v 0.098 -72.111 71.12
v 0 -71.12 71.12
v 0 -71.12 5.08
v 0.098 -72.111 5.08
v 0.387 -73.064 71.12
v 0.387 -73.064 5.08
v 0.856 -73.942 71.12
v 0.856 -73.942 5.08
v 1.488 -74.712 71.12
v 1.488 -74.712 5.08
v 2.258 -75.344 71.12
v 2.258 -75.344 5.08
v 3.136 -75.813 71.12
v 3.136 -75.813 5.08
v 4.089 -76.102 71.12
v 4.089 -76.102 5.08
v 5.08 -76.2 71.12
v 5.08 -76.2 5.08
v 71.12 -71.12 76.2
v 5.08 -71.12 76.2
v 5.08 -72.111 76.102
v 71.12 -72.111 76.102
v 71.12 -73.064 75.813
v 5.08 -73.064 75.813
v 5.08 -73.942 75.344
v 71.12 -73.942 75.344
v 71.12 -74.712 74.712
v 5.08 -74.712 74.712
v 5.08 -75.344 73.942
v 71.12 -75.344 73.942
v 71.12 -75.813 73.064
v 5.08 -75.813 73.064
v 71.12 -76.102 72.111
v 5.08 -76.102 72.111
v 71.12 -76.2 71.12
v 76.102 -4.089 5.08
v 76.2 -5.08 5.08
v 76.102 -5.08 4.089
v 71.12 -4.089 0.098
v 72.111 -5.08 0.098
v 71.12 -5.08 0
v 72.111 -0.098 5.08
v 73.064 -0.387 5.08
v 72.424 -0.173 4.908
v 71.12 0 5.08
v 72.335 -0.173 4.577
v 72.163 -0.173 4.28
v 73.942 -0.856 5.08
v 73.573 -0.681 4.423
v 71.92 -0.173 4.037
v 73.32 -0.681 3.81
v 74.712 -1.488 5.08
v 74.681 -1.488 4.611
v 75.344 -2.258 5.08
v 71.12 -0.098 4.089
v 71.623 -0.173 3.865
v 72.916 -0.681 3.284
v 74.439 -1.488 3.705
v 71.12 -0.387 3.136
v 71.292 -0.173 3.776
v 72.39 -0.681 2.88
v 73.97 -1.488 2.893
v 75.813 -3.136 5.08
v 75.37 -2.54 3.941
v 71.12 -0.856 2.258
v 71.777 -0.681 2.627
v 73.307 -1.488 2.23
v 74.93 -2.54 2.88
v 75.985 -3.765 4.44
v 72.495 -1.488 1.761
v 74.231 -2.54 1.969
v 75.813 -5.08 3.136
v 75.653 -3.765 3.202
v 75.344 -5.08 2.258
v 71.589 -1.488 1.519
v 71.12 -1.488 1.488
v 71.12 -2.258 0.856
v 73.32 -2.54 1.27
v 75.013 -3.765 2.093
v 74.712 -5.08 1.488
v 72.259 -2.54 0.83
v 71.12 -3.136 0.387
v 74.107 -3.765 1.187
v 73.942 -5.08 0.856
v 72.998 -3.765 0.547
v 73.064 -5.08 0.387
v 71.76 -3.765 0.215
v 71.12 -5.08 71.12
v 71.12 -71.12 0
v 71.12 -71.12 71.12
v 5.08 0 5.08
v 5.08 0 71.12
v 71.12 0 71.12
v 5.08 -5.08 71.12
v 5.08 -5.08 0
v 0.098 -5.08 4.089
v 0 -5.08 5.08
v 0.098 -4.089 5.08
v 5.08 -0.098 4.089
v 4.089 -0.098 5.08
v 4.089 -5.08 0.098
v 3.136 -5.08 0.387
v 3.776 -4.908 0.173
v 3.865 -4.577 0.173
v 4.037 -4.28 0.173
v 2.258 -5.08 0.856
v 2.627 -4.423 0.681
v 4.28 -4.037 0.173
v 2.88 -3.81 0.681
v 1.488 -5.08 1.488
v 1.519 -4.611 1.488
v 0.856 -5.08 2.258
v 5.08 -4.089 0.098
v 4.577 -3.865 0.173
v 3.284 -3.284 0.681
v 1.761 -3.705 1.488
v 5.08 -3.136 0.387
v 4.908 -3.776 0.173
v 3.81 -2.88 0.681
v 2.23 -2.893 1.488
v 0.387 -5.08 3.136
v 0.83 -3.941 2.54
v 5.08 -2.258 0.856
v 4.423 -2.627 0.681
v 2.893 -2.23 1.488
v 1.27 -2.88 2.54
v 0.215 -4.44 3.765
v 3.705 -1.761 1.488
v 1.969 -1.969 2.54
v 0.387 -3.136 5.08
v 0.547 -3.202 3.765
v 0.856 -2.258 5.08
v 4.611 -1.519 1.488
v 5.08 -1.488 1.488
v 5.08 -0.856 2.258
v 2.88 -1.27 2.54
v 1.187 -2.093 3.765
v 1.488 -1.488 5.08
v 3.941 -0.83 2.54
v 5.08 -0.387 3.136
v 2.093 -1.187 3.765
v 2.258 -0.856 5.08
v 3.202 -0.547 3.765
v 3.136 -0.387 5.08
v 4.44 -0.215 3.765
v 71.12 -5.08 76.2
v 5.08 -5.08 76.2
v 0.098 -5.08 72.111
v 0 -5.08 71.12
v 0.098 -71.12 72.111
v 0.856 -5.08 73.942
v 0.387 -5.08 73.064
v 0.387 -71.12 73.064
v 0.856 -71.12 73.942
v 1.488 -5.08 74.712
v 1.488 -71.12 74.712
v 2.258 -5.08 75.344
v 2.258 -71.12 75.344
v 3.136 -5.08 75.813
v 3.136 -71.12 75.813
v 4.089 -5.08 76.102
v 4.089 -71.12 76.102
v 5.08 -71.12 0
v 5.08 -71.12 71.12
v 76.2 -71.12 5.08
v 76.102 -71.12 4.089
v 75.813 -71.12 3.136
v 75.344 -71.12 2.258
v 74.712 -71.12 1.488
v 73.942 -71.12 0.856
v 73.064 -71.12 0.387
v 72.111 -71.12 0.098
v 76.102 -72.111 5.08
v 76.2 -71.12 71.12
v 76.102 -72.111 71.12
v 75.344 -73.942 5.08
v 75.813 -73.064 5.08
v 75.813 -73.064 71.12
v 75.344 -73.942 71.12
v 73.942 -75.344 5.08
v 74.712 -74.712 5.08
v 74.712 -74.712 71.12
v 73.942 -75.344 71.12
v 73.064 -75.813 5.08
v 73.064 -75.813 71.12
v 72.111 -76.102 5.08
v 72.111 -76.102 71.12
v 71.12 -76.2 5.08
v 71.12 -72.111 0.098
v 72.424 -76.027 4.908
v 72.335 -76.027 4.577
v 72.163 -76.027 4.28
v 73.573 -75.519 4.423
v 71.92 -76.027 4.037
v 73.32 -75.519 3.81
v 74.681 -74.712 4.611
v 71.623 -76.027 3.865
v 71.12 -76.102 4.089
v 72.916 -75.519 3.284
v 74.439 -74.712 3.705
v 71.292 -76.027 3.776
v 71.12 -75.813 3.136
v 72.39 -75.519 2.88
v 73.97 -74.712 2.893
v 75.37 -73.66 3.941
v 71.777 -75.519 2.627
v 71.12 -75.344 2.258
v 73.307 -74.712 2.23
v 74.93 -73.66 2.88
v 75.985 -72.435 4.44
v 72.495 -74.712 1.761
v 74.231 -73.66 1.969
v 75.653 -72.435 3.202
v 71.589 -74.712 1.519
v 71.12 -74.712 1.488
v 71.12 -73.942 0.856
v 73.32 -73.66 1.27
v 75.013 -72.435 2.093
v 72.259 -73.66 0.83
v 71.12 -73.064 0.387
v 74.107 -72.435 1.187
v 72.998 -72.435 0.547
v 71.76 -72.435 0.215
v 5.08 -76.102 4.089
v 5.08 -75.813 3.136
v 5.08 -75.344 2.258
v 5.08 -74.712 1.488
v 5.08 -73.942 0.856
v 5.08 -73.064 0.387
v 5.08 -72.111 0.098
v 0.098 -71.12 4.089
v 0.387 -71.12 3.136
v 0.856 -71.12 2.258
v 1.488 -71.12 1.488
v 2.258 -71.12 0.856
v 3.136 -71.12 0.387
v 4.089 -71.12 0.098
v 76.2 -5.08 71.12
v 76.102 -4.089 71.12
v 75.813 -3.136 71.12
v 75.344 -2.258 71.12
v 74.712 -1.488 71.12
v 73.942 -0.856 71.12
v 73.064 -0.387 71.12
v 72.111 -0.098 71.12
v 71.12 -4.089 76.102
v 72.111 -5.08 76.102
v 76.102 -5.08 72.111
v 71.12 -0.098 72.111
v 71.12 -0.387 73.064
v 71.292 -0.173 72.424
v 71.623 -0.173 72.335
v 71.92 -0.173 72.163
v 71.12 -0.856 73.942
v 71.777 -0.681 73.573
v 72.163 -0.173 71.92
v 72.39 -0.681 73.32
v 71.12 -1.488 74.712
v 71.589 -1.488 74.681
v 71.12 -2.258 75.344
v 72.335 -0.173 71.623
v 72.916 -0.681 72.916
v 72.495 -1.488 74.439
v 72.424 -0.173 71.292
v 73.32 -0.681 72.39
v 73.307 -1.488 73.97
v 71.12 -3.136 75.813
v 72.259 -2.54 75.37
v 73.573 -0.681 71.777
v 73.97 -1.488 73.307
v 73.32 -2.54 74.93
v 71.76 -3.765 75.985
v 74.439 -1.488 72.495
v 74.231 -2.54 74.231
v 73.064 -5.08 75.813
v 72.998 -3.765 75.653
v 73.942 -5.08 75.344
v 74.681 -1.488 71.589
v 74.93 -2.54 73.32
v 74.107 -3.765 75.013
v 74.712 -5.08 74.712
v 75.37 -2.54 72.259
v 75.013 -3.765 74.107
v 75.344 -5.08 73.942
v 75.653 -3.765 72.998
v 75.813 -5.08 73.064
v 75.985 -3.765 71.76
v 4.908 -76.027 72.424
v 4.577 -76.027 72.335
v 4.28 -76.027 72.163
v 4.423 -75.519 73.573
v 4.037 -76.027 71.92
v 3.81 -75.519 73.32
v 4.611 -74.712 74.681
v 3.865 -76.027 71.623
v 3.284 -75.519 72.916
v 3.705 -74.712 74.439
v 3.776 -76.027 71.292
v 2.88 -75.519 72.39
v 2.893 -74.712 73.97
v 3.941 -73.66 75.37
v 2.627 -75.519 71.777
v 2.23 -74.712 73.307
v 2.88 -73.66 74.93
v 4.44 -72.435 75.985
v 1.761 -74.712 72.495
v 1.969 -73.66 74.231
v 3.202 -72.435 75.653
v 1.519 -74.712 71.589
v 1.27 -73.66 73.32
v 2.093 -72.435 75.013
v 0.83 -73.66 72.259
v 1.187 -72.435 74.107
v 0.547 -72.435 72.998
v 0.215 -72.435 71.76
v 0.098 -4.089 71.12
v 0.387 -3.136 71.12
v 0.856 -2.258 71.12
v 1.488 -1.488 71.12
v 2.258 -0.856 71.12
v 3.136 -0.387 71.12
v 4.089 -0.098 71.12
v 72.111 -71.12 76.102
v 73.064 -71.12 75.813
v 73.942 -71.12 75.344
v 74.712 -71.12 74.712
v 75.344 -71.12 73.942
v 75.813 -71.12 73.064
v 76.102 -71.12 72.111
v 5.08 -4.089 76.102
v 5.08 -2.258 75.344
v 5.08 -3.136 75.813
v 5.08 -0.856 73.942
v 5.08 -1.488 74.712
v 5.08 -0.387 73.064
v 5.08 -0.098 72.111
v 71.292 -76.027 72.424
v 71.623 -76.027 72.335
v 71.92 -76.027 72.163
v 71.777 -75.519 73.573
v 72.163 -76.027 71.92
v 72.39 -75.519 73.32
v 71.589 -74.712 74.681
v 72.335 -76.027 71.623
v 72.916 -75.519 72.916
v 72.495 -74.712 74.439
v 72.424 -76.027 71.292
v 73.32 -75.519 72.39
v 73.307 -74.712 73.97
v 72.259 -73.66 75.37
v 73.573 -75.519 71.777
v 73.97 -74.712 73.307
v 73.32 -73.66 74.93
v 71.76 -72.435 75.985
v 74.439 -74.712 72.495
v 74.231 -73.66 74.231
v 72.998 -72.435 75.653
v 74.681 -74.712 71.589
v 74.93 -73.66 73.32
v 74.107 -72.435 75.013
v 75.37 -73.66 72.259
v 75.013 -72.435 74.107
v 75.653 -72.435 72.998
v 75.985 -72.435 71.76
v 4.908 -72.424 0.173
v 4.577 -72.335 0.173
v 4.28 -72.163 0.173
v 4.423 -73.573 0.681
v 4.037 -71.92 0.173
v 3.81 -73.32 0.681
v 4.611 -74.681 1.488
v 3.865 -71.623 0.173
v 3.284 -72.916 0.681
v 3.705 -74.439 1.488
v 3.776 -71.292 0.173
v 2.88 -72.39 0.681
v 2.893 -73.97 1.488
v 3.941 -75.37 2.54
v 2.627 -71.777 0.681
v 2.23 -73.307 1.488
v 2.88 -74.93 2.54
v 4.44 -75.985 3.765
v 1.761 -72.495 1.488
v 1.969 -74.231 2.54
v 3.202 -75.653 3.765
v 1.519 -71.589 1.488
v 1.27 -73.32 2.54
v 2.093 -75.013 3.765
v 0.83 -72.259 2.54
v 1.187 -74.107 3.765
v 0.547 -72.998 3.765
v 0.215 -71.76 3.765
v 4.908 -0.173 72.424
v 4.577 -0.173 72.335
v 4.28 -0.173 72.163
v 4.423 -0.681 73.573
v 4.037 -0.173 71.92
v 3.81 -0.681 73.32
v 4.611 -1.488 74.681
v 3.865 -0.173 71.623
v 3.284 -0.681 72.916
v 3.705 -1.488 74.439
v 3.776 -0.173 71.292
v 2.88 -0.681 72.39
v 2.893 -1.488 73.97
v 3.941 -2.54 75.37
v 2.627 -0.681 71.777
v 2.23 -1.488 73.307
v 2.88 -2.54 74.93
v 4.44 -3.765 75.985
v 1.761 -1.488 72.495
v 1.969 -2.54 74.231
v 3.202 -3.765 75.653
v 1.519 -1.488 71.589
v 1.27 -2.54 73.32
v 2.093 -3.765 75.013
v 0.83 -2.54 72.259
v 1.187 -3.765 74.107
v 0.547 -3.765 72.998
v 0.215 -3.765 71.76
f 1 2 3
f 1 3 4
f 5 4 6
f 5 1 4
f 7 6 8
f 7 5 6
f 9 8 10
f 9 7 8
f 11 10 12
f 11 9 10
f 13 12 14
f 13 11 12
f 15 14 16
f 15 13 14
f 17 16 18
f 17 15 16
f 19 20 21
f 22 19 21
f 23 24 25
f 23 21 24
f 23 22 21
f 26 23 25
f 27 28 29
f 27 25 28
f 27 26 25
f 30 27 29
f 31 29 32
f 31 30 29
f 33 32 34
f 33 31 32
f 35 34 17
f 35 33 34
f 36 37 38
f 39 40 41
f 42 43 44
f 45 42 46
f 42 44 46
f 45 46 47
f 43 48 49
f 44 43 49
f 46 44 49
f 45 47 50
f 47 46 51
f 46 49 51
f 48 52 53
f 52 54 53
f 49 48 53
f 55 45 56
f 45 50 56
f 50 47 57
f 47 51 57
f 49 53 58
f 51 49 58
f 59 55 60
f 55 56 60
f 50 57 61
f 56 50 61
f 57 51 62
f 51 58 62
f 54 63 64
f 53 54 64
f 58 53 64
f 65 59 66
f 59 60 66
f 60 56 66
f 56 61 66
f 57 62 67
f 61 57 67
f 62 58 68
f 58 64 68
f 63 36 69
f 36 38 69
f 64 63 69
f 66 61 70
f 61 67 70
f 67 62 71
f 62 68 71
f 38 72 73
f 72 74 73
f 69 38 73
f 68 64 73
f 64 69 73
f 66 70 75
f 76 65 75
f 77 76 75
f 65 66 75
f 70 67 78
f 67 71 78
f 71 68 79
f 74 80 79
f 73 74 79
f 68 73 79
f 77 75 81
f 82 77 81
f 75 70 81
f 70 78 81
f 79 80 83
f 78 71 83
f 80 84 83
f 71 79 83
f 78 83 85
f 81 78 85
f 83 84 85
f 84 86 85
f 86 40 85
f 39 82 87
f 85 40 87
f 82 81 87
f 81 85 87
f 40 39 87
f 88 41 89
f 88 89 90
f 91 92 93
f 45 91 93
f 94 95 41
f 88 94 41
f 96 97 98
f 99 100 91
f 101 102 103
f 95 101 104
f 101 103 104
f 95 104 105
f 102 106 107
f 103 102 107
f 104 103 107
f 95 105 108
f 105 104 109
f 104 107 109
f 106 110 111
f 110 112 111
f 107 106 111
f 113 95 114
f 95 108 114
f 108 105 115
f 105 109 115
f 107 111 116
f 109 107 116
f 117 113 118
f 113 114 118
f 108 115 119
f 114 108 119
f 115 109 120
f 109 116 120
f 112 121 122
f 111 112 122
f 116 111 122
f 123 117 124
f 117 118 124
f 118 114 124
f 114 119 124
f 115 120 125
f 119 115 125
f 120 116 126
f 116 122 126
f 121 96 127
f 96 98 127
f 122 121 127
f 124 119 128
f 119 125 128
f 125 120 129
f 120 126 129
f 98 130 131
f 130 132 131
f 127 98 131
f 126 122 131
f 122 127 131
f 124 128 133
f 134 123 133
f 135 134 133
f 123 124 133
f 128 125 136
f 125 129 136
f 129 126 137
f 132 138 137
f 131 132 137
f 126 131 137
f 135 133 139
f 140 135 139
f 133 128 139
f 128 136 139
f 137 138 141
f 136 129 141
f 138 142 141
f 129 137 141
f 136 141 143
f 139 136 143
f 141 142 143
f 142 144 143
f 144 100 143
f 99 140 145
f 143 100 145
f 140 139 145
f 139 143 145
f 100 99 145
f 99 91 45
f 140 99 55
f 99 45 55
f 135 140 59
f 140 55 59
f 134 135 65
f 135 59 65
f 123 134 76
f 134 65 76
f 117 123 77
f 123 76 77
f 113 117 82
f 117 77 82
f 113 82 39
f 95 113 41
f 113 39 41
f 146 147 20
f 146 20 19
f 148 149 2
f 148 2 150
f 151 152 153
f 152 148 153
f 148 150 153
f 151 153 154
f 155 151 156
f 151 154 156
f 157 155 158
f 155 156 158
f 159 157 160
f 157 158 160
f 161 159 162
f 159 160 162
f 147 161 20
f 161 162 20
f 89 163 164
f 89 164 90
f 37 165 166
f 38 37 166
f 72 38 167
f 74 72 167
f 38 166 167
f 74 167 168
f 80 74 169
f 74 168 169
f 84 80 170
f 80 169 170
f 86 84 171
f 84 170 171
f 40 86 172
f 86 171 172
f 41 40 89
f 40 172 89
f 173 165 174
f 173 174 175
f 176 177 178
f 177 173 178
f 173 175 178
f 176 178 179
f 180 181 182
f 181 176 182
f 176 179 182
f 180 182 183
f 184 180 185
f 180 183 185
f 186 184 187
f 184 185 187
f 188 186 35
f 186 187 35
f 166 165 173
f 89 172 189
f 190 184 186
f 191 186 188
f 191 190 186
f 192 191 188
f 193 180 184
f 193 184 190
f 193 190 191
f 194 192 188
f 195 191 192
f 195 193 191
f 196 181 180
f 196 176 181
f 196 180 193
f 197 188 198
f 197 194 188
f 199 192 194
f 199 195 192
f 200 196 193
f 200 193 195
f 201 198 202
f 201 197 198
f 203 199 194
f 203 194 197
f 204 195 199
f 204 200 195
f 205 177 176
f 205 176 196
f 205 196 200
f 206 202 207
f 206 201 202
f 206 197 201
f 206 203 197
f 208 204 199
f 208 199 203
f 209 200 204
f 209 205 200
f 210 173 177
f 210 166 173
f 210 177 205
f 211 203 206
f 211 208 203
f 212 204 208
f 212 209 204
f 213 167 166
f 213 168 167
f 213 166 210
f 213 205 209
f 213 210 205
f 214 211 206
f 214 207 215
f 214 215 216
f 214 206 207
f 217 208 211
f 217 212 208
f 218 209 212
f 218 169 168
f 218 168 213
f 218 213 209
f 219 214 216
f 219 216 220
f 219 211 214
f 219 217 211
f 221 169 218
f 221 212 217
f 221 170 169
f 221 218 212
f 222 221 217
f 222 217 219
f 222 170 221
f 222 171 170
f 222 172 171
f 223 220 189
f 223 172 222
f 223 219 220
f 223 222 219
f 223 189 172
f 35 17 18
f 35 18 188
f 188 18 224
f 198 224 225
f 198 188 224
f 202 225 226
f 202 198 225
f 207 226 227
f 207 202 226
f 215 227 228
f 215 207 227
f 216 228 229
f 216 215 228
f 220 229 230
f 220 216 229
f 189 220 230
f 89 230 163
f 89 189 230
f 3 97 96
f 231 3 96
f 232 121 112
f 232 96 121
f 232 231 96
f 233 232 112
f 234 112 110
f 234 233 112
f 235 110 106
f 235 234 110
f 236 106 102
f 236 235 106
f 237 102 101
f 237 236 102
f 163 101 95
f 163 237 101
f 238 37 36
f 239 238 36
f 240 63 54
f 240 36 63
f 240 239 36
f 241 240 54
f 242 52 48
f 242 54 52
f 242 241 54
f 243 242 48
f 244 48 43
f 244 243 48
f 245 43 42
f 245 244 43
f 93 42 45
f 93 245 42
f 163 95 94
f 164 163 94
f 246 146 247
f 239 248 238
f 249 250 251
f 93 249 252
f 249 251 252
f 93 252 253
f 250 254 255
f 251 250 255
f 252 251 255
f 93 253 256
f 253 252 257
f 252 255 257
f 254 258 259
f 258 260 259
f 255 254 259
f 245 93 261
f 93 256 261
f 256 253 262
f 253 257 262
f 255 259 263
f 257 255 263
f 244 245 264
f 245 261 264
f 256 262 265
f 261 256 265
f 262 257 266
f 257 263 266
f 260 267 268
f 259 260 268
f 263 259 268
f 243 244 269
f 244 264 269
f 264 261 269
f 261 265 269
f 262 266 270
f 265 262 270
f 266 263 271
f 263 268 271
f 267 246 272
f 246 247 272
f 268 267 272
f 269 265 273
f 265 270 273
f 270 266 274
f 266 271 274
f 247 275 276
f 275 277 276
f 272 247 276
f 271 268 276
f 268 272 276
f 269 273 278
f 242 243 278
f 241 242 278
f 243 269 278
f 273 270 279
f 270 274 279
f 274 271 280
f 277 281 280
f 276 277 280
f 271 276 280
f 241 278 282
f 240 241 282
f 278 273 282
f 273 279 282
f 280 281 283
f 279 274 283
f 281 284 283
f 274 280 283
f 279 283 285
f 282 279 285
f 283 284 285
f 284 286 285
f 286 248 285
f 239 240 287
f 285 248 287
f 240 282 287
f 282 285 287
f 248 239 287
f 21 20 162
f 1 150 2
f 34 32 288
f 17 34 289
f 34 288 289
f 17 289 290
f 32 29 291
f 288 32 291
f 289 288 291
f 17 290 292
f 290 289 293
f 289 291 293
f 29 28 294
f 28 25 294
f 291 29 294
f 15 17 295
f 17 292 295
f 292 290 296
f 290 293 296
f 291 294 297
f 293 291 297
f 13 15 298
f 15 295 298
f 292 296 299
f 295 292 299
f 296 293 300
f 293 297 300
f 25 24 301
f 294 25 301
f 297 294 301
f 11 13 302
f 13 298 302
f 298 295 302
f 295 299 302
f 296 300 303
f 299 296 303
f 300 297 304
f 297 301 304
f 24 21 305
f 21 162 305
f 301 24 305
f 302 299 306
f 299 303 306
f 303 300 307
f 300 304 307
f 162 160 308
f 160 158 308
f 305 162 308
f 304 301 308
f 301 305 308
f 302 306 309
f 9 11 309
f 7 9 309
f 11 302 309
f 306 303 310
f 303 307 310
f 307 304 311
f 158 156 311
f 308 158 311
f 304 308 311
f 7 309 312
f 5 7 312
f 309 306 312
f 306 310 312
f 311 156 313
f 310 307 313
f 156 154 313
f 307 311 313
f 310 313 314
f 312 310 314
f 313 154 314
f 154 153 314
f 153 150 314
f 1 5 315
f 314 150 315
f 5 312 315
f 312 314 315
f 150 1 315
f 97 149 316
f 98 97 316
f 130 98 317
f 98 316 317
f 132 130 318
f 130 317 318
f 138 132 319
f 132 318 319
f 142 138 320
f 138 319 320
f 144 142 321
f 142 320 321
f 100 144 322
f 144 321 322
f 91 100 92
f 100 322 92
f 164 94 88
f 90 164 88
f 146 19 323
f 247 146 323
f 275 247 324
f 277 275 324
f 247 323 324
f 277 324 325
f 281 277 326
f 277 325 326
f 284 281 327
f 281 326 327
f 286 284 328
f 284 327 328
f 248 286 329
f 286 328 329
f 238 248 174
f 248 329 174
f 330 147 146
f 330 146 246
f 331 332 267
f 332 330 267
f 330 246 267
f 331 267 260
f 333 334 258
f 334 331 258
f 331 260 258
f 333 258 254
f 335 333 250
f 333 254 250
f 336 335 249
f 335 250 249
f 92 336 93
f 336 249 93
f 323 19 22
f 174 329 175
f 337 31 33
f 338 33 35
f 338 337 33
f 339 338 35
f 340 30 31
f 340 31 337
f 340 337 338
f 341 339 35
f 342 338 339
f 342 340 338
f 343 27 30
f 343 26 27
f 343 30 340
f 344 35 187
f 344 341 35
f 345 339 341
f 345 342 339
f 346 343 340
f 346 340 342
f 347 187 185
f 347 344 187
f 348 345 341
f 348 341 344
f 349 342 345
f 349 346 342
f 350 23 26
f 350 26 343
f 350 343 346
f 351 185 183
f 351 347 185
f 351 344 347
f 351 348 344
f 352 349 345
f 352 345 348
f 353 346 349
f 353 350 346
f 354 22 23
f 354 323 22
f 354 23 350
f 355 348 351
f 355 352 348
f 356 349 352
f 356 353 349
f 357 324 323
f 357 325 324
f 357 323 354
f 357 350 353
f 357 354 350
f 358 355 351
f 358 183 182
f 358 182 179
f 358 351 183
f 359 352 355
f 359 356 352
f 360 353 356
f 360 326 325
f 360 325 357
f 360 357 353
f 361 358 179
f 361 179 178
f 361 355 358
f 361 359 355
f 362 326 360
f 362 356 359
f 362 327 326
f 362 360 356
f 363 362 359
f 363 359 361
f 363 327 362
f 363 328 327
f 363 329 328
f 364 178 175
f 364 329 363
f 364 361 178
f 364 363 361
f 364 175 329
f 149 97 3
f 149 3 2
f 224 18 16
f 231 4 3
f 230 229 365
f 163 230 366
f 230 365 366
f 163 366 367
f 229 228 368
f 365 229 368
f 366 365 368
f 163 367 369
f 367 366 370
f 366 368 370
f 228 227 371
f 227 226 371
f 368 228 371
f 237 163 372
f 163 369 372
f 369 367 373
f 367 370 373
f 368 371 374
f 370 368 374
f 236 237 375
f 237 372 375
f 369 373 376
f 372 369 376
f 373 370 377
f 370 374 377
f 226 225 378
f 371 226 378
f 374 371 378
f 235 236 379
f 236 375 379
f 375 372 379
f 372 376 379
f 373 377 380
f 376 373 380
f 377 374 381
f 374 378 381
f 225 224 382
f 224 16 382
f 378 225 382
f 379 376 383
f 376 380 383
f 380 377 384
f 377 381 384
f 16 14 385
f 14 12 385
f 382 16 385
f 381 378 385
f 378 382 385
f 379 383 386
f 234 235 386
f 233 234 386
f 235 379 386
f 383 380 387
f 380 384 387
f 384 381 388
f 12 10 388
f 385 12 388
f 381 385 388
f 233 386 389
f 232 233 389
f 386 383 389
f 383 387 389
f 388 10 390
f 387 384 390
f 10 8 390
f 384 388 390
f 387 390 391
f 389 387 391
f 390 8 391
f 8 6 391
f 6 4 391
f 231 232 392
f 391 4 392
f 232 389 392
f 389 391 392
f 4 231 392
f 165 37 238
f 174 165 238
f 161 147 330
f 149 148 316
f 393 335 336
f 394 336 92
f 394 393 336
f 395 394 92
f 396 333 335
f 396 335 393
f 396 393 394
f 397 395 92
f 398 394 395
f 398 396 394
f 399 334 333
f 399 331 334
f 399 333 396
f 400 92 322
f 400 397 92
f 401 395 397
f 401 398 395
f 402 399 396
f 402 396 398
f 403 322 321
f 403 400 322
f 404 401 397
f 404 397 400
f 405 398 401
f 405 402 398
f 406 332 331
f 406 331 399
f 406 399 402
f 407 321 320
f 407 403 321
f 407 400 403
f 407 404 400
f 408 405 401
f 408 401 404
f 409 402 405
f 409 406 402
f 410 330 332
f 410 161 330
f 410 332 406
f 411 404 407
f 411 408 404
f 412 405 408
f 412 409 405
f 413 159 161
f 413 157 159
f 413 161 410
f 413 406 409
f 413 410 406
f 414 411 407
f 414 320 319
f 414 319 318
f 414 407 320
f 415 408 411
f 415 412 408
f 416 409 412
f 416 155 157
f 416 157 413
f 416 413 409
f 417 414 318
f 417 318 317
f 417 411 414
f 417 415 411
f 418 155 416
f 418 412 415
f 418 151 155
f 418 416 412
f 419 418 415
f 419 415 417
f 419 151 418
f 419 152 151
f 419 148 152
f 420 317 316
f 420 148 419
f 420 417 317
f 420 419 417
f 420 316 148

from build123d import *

# Parameters (mm, degrees)
F0_W     = 76.2
F0_H     = 76.2
F1_DEPTH = 76.2
F2_T     = -5.08
F3_R     = 5.07999


# Not quite as in the source:
# - a fillet or chamfer is up to 0.001 mm smaller than in the source, because OpenCascade refuses the exact size


with BuildPart() as f1:
    # F0 (on Front) → F1 (new body)
    with BuildSketch(Plane.XZ):
        with Locations((38.1, 38.1)):
            Rectangle(F0_W, F0_H)
    extrude(amount=F1_DEPTH)

    # F2
    f2_openings = [f1.faces().sort_by_distance(p)[0] for p in [
        (38.1, -38.1, 0),
    ]]
    offset(amount=F2_T, openings=f2_openings)

    # F3 (radius 5.08 in the source; OpenCascade refuses exactly that, so slightly less here)
    f3_edges = [f1.edges().sort_by_distance(p)[0] for p in [
        (76.2, -38.1, 76.2),
        (0, -38.1, 76.2),
        (38.1, 0, 76.2),
        (38.1, -76.2, 76.2),
        (76.2, -38.1, 0),
        (76.2, 0, 38.1),
        (76.2, -76.2, 38.1),
        (0, 0, 38.1),
        (0, -76.2, 38.1),
        (38.1, -76.2, 0),
        (0, -38.1, 0),
        (38.1, 0, 0),
    ]]
    fillet(f3_edges, radius=F3_R)


solid = f1.part
